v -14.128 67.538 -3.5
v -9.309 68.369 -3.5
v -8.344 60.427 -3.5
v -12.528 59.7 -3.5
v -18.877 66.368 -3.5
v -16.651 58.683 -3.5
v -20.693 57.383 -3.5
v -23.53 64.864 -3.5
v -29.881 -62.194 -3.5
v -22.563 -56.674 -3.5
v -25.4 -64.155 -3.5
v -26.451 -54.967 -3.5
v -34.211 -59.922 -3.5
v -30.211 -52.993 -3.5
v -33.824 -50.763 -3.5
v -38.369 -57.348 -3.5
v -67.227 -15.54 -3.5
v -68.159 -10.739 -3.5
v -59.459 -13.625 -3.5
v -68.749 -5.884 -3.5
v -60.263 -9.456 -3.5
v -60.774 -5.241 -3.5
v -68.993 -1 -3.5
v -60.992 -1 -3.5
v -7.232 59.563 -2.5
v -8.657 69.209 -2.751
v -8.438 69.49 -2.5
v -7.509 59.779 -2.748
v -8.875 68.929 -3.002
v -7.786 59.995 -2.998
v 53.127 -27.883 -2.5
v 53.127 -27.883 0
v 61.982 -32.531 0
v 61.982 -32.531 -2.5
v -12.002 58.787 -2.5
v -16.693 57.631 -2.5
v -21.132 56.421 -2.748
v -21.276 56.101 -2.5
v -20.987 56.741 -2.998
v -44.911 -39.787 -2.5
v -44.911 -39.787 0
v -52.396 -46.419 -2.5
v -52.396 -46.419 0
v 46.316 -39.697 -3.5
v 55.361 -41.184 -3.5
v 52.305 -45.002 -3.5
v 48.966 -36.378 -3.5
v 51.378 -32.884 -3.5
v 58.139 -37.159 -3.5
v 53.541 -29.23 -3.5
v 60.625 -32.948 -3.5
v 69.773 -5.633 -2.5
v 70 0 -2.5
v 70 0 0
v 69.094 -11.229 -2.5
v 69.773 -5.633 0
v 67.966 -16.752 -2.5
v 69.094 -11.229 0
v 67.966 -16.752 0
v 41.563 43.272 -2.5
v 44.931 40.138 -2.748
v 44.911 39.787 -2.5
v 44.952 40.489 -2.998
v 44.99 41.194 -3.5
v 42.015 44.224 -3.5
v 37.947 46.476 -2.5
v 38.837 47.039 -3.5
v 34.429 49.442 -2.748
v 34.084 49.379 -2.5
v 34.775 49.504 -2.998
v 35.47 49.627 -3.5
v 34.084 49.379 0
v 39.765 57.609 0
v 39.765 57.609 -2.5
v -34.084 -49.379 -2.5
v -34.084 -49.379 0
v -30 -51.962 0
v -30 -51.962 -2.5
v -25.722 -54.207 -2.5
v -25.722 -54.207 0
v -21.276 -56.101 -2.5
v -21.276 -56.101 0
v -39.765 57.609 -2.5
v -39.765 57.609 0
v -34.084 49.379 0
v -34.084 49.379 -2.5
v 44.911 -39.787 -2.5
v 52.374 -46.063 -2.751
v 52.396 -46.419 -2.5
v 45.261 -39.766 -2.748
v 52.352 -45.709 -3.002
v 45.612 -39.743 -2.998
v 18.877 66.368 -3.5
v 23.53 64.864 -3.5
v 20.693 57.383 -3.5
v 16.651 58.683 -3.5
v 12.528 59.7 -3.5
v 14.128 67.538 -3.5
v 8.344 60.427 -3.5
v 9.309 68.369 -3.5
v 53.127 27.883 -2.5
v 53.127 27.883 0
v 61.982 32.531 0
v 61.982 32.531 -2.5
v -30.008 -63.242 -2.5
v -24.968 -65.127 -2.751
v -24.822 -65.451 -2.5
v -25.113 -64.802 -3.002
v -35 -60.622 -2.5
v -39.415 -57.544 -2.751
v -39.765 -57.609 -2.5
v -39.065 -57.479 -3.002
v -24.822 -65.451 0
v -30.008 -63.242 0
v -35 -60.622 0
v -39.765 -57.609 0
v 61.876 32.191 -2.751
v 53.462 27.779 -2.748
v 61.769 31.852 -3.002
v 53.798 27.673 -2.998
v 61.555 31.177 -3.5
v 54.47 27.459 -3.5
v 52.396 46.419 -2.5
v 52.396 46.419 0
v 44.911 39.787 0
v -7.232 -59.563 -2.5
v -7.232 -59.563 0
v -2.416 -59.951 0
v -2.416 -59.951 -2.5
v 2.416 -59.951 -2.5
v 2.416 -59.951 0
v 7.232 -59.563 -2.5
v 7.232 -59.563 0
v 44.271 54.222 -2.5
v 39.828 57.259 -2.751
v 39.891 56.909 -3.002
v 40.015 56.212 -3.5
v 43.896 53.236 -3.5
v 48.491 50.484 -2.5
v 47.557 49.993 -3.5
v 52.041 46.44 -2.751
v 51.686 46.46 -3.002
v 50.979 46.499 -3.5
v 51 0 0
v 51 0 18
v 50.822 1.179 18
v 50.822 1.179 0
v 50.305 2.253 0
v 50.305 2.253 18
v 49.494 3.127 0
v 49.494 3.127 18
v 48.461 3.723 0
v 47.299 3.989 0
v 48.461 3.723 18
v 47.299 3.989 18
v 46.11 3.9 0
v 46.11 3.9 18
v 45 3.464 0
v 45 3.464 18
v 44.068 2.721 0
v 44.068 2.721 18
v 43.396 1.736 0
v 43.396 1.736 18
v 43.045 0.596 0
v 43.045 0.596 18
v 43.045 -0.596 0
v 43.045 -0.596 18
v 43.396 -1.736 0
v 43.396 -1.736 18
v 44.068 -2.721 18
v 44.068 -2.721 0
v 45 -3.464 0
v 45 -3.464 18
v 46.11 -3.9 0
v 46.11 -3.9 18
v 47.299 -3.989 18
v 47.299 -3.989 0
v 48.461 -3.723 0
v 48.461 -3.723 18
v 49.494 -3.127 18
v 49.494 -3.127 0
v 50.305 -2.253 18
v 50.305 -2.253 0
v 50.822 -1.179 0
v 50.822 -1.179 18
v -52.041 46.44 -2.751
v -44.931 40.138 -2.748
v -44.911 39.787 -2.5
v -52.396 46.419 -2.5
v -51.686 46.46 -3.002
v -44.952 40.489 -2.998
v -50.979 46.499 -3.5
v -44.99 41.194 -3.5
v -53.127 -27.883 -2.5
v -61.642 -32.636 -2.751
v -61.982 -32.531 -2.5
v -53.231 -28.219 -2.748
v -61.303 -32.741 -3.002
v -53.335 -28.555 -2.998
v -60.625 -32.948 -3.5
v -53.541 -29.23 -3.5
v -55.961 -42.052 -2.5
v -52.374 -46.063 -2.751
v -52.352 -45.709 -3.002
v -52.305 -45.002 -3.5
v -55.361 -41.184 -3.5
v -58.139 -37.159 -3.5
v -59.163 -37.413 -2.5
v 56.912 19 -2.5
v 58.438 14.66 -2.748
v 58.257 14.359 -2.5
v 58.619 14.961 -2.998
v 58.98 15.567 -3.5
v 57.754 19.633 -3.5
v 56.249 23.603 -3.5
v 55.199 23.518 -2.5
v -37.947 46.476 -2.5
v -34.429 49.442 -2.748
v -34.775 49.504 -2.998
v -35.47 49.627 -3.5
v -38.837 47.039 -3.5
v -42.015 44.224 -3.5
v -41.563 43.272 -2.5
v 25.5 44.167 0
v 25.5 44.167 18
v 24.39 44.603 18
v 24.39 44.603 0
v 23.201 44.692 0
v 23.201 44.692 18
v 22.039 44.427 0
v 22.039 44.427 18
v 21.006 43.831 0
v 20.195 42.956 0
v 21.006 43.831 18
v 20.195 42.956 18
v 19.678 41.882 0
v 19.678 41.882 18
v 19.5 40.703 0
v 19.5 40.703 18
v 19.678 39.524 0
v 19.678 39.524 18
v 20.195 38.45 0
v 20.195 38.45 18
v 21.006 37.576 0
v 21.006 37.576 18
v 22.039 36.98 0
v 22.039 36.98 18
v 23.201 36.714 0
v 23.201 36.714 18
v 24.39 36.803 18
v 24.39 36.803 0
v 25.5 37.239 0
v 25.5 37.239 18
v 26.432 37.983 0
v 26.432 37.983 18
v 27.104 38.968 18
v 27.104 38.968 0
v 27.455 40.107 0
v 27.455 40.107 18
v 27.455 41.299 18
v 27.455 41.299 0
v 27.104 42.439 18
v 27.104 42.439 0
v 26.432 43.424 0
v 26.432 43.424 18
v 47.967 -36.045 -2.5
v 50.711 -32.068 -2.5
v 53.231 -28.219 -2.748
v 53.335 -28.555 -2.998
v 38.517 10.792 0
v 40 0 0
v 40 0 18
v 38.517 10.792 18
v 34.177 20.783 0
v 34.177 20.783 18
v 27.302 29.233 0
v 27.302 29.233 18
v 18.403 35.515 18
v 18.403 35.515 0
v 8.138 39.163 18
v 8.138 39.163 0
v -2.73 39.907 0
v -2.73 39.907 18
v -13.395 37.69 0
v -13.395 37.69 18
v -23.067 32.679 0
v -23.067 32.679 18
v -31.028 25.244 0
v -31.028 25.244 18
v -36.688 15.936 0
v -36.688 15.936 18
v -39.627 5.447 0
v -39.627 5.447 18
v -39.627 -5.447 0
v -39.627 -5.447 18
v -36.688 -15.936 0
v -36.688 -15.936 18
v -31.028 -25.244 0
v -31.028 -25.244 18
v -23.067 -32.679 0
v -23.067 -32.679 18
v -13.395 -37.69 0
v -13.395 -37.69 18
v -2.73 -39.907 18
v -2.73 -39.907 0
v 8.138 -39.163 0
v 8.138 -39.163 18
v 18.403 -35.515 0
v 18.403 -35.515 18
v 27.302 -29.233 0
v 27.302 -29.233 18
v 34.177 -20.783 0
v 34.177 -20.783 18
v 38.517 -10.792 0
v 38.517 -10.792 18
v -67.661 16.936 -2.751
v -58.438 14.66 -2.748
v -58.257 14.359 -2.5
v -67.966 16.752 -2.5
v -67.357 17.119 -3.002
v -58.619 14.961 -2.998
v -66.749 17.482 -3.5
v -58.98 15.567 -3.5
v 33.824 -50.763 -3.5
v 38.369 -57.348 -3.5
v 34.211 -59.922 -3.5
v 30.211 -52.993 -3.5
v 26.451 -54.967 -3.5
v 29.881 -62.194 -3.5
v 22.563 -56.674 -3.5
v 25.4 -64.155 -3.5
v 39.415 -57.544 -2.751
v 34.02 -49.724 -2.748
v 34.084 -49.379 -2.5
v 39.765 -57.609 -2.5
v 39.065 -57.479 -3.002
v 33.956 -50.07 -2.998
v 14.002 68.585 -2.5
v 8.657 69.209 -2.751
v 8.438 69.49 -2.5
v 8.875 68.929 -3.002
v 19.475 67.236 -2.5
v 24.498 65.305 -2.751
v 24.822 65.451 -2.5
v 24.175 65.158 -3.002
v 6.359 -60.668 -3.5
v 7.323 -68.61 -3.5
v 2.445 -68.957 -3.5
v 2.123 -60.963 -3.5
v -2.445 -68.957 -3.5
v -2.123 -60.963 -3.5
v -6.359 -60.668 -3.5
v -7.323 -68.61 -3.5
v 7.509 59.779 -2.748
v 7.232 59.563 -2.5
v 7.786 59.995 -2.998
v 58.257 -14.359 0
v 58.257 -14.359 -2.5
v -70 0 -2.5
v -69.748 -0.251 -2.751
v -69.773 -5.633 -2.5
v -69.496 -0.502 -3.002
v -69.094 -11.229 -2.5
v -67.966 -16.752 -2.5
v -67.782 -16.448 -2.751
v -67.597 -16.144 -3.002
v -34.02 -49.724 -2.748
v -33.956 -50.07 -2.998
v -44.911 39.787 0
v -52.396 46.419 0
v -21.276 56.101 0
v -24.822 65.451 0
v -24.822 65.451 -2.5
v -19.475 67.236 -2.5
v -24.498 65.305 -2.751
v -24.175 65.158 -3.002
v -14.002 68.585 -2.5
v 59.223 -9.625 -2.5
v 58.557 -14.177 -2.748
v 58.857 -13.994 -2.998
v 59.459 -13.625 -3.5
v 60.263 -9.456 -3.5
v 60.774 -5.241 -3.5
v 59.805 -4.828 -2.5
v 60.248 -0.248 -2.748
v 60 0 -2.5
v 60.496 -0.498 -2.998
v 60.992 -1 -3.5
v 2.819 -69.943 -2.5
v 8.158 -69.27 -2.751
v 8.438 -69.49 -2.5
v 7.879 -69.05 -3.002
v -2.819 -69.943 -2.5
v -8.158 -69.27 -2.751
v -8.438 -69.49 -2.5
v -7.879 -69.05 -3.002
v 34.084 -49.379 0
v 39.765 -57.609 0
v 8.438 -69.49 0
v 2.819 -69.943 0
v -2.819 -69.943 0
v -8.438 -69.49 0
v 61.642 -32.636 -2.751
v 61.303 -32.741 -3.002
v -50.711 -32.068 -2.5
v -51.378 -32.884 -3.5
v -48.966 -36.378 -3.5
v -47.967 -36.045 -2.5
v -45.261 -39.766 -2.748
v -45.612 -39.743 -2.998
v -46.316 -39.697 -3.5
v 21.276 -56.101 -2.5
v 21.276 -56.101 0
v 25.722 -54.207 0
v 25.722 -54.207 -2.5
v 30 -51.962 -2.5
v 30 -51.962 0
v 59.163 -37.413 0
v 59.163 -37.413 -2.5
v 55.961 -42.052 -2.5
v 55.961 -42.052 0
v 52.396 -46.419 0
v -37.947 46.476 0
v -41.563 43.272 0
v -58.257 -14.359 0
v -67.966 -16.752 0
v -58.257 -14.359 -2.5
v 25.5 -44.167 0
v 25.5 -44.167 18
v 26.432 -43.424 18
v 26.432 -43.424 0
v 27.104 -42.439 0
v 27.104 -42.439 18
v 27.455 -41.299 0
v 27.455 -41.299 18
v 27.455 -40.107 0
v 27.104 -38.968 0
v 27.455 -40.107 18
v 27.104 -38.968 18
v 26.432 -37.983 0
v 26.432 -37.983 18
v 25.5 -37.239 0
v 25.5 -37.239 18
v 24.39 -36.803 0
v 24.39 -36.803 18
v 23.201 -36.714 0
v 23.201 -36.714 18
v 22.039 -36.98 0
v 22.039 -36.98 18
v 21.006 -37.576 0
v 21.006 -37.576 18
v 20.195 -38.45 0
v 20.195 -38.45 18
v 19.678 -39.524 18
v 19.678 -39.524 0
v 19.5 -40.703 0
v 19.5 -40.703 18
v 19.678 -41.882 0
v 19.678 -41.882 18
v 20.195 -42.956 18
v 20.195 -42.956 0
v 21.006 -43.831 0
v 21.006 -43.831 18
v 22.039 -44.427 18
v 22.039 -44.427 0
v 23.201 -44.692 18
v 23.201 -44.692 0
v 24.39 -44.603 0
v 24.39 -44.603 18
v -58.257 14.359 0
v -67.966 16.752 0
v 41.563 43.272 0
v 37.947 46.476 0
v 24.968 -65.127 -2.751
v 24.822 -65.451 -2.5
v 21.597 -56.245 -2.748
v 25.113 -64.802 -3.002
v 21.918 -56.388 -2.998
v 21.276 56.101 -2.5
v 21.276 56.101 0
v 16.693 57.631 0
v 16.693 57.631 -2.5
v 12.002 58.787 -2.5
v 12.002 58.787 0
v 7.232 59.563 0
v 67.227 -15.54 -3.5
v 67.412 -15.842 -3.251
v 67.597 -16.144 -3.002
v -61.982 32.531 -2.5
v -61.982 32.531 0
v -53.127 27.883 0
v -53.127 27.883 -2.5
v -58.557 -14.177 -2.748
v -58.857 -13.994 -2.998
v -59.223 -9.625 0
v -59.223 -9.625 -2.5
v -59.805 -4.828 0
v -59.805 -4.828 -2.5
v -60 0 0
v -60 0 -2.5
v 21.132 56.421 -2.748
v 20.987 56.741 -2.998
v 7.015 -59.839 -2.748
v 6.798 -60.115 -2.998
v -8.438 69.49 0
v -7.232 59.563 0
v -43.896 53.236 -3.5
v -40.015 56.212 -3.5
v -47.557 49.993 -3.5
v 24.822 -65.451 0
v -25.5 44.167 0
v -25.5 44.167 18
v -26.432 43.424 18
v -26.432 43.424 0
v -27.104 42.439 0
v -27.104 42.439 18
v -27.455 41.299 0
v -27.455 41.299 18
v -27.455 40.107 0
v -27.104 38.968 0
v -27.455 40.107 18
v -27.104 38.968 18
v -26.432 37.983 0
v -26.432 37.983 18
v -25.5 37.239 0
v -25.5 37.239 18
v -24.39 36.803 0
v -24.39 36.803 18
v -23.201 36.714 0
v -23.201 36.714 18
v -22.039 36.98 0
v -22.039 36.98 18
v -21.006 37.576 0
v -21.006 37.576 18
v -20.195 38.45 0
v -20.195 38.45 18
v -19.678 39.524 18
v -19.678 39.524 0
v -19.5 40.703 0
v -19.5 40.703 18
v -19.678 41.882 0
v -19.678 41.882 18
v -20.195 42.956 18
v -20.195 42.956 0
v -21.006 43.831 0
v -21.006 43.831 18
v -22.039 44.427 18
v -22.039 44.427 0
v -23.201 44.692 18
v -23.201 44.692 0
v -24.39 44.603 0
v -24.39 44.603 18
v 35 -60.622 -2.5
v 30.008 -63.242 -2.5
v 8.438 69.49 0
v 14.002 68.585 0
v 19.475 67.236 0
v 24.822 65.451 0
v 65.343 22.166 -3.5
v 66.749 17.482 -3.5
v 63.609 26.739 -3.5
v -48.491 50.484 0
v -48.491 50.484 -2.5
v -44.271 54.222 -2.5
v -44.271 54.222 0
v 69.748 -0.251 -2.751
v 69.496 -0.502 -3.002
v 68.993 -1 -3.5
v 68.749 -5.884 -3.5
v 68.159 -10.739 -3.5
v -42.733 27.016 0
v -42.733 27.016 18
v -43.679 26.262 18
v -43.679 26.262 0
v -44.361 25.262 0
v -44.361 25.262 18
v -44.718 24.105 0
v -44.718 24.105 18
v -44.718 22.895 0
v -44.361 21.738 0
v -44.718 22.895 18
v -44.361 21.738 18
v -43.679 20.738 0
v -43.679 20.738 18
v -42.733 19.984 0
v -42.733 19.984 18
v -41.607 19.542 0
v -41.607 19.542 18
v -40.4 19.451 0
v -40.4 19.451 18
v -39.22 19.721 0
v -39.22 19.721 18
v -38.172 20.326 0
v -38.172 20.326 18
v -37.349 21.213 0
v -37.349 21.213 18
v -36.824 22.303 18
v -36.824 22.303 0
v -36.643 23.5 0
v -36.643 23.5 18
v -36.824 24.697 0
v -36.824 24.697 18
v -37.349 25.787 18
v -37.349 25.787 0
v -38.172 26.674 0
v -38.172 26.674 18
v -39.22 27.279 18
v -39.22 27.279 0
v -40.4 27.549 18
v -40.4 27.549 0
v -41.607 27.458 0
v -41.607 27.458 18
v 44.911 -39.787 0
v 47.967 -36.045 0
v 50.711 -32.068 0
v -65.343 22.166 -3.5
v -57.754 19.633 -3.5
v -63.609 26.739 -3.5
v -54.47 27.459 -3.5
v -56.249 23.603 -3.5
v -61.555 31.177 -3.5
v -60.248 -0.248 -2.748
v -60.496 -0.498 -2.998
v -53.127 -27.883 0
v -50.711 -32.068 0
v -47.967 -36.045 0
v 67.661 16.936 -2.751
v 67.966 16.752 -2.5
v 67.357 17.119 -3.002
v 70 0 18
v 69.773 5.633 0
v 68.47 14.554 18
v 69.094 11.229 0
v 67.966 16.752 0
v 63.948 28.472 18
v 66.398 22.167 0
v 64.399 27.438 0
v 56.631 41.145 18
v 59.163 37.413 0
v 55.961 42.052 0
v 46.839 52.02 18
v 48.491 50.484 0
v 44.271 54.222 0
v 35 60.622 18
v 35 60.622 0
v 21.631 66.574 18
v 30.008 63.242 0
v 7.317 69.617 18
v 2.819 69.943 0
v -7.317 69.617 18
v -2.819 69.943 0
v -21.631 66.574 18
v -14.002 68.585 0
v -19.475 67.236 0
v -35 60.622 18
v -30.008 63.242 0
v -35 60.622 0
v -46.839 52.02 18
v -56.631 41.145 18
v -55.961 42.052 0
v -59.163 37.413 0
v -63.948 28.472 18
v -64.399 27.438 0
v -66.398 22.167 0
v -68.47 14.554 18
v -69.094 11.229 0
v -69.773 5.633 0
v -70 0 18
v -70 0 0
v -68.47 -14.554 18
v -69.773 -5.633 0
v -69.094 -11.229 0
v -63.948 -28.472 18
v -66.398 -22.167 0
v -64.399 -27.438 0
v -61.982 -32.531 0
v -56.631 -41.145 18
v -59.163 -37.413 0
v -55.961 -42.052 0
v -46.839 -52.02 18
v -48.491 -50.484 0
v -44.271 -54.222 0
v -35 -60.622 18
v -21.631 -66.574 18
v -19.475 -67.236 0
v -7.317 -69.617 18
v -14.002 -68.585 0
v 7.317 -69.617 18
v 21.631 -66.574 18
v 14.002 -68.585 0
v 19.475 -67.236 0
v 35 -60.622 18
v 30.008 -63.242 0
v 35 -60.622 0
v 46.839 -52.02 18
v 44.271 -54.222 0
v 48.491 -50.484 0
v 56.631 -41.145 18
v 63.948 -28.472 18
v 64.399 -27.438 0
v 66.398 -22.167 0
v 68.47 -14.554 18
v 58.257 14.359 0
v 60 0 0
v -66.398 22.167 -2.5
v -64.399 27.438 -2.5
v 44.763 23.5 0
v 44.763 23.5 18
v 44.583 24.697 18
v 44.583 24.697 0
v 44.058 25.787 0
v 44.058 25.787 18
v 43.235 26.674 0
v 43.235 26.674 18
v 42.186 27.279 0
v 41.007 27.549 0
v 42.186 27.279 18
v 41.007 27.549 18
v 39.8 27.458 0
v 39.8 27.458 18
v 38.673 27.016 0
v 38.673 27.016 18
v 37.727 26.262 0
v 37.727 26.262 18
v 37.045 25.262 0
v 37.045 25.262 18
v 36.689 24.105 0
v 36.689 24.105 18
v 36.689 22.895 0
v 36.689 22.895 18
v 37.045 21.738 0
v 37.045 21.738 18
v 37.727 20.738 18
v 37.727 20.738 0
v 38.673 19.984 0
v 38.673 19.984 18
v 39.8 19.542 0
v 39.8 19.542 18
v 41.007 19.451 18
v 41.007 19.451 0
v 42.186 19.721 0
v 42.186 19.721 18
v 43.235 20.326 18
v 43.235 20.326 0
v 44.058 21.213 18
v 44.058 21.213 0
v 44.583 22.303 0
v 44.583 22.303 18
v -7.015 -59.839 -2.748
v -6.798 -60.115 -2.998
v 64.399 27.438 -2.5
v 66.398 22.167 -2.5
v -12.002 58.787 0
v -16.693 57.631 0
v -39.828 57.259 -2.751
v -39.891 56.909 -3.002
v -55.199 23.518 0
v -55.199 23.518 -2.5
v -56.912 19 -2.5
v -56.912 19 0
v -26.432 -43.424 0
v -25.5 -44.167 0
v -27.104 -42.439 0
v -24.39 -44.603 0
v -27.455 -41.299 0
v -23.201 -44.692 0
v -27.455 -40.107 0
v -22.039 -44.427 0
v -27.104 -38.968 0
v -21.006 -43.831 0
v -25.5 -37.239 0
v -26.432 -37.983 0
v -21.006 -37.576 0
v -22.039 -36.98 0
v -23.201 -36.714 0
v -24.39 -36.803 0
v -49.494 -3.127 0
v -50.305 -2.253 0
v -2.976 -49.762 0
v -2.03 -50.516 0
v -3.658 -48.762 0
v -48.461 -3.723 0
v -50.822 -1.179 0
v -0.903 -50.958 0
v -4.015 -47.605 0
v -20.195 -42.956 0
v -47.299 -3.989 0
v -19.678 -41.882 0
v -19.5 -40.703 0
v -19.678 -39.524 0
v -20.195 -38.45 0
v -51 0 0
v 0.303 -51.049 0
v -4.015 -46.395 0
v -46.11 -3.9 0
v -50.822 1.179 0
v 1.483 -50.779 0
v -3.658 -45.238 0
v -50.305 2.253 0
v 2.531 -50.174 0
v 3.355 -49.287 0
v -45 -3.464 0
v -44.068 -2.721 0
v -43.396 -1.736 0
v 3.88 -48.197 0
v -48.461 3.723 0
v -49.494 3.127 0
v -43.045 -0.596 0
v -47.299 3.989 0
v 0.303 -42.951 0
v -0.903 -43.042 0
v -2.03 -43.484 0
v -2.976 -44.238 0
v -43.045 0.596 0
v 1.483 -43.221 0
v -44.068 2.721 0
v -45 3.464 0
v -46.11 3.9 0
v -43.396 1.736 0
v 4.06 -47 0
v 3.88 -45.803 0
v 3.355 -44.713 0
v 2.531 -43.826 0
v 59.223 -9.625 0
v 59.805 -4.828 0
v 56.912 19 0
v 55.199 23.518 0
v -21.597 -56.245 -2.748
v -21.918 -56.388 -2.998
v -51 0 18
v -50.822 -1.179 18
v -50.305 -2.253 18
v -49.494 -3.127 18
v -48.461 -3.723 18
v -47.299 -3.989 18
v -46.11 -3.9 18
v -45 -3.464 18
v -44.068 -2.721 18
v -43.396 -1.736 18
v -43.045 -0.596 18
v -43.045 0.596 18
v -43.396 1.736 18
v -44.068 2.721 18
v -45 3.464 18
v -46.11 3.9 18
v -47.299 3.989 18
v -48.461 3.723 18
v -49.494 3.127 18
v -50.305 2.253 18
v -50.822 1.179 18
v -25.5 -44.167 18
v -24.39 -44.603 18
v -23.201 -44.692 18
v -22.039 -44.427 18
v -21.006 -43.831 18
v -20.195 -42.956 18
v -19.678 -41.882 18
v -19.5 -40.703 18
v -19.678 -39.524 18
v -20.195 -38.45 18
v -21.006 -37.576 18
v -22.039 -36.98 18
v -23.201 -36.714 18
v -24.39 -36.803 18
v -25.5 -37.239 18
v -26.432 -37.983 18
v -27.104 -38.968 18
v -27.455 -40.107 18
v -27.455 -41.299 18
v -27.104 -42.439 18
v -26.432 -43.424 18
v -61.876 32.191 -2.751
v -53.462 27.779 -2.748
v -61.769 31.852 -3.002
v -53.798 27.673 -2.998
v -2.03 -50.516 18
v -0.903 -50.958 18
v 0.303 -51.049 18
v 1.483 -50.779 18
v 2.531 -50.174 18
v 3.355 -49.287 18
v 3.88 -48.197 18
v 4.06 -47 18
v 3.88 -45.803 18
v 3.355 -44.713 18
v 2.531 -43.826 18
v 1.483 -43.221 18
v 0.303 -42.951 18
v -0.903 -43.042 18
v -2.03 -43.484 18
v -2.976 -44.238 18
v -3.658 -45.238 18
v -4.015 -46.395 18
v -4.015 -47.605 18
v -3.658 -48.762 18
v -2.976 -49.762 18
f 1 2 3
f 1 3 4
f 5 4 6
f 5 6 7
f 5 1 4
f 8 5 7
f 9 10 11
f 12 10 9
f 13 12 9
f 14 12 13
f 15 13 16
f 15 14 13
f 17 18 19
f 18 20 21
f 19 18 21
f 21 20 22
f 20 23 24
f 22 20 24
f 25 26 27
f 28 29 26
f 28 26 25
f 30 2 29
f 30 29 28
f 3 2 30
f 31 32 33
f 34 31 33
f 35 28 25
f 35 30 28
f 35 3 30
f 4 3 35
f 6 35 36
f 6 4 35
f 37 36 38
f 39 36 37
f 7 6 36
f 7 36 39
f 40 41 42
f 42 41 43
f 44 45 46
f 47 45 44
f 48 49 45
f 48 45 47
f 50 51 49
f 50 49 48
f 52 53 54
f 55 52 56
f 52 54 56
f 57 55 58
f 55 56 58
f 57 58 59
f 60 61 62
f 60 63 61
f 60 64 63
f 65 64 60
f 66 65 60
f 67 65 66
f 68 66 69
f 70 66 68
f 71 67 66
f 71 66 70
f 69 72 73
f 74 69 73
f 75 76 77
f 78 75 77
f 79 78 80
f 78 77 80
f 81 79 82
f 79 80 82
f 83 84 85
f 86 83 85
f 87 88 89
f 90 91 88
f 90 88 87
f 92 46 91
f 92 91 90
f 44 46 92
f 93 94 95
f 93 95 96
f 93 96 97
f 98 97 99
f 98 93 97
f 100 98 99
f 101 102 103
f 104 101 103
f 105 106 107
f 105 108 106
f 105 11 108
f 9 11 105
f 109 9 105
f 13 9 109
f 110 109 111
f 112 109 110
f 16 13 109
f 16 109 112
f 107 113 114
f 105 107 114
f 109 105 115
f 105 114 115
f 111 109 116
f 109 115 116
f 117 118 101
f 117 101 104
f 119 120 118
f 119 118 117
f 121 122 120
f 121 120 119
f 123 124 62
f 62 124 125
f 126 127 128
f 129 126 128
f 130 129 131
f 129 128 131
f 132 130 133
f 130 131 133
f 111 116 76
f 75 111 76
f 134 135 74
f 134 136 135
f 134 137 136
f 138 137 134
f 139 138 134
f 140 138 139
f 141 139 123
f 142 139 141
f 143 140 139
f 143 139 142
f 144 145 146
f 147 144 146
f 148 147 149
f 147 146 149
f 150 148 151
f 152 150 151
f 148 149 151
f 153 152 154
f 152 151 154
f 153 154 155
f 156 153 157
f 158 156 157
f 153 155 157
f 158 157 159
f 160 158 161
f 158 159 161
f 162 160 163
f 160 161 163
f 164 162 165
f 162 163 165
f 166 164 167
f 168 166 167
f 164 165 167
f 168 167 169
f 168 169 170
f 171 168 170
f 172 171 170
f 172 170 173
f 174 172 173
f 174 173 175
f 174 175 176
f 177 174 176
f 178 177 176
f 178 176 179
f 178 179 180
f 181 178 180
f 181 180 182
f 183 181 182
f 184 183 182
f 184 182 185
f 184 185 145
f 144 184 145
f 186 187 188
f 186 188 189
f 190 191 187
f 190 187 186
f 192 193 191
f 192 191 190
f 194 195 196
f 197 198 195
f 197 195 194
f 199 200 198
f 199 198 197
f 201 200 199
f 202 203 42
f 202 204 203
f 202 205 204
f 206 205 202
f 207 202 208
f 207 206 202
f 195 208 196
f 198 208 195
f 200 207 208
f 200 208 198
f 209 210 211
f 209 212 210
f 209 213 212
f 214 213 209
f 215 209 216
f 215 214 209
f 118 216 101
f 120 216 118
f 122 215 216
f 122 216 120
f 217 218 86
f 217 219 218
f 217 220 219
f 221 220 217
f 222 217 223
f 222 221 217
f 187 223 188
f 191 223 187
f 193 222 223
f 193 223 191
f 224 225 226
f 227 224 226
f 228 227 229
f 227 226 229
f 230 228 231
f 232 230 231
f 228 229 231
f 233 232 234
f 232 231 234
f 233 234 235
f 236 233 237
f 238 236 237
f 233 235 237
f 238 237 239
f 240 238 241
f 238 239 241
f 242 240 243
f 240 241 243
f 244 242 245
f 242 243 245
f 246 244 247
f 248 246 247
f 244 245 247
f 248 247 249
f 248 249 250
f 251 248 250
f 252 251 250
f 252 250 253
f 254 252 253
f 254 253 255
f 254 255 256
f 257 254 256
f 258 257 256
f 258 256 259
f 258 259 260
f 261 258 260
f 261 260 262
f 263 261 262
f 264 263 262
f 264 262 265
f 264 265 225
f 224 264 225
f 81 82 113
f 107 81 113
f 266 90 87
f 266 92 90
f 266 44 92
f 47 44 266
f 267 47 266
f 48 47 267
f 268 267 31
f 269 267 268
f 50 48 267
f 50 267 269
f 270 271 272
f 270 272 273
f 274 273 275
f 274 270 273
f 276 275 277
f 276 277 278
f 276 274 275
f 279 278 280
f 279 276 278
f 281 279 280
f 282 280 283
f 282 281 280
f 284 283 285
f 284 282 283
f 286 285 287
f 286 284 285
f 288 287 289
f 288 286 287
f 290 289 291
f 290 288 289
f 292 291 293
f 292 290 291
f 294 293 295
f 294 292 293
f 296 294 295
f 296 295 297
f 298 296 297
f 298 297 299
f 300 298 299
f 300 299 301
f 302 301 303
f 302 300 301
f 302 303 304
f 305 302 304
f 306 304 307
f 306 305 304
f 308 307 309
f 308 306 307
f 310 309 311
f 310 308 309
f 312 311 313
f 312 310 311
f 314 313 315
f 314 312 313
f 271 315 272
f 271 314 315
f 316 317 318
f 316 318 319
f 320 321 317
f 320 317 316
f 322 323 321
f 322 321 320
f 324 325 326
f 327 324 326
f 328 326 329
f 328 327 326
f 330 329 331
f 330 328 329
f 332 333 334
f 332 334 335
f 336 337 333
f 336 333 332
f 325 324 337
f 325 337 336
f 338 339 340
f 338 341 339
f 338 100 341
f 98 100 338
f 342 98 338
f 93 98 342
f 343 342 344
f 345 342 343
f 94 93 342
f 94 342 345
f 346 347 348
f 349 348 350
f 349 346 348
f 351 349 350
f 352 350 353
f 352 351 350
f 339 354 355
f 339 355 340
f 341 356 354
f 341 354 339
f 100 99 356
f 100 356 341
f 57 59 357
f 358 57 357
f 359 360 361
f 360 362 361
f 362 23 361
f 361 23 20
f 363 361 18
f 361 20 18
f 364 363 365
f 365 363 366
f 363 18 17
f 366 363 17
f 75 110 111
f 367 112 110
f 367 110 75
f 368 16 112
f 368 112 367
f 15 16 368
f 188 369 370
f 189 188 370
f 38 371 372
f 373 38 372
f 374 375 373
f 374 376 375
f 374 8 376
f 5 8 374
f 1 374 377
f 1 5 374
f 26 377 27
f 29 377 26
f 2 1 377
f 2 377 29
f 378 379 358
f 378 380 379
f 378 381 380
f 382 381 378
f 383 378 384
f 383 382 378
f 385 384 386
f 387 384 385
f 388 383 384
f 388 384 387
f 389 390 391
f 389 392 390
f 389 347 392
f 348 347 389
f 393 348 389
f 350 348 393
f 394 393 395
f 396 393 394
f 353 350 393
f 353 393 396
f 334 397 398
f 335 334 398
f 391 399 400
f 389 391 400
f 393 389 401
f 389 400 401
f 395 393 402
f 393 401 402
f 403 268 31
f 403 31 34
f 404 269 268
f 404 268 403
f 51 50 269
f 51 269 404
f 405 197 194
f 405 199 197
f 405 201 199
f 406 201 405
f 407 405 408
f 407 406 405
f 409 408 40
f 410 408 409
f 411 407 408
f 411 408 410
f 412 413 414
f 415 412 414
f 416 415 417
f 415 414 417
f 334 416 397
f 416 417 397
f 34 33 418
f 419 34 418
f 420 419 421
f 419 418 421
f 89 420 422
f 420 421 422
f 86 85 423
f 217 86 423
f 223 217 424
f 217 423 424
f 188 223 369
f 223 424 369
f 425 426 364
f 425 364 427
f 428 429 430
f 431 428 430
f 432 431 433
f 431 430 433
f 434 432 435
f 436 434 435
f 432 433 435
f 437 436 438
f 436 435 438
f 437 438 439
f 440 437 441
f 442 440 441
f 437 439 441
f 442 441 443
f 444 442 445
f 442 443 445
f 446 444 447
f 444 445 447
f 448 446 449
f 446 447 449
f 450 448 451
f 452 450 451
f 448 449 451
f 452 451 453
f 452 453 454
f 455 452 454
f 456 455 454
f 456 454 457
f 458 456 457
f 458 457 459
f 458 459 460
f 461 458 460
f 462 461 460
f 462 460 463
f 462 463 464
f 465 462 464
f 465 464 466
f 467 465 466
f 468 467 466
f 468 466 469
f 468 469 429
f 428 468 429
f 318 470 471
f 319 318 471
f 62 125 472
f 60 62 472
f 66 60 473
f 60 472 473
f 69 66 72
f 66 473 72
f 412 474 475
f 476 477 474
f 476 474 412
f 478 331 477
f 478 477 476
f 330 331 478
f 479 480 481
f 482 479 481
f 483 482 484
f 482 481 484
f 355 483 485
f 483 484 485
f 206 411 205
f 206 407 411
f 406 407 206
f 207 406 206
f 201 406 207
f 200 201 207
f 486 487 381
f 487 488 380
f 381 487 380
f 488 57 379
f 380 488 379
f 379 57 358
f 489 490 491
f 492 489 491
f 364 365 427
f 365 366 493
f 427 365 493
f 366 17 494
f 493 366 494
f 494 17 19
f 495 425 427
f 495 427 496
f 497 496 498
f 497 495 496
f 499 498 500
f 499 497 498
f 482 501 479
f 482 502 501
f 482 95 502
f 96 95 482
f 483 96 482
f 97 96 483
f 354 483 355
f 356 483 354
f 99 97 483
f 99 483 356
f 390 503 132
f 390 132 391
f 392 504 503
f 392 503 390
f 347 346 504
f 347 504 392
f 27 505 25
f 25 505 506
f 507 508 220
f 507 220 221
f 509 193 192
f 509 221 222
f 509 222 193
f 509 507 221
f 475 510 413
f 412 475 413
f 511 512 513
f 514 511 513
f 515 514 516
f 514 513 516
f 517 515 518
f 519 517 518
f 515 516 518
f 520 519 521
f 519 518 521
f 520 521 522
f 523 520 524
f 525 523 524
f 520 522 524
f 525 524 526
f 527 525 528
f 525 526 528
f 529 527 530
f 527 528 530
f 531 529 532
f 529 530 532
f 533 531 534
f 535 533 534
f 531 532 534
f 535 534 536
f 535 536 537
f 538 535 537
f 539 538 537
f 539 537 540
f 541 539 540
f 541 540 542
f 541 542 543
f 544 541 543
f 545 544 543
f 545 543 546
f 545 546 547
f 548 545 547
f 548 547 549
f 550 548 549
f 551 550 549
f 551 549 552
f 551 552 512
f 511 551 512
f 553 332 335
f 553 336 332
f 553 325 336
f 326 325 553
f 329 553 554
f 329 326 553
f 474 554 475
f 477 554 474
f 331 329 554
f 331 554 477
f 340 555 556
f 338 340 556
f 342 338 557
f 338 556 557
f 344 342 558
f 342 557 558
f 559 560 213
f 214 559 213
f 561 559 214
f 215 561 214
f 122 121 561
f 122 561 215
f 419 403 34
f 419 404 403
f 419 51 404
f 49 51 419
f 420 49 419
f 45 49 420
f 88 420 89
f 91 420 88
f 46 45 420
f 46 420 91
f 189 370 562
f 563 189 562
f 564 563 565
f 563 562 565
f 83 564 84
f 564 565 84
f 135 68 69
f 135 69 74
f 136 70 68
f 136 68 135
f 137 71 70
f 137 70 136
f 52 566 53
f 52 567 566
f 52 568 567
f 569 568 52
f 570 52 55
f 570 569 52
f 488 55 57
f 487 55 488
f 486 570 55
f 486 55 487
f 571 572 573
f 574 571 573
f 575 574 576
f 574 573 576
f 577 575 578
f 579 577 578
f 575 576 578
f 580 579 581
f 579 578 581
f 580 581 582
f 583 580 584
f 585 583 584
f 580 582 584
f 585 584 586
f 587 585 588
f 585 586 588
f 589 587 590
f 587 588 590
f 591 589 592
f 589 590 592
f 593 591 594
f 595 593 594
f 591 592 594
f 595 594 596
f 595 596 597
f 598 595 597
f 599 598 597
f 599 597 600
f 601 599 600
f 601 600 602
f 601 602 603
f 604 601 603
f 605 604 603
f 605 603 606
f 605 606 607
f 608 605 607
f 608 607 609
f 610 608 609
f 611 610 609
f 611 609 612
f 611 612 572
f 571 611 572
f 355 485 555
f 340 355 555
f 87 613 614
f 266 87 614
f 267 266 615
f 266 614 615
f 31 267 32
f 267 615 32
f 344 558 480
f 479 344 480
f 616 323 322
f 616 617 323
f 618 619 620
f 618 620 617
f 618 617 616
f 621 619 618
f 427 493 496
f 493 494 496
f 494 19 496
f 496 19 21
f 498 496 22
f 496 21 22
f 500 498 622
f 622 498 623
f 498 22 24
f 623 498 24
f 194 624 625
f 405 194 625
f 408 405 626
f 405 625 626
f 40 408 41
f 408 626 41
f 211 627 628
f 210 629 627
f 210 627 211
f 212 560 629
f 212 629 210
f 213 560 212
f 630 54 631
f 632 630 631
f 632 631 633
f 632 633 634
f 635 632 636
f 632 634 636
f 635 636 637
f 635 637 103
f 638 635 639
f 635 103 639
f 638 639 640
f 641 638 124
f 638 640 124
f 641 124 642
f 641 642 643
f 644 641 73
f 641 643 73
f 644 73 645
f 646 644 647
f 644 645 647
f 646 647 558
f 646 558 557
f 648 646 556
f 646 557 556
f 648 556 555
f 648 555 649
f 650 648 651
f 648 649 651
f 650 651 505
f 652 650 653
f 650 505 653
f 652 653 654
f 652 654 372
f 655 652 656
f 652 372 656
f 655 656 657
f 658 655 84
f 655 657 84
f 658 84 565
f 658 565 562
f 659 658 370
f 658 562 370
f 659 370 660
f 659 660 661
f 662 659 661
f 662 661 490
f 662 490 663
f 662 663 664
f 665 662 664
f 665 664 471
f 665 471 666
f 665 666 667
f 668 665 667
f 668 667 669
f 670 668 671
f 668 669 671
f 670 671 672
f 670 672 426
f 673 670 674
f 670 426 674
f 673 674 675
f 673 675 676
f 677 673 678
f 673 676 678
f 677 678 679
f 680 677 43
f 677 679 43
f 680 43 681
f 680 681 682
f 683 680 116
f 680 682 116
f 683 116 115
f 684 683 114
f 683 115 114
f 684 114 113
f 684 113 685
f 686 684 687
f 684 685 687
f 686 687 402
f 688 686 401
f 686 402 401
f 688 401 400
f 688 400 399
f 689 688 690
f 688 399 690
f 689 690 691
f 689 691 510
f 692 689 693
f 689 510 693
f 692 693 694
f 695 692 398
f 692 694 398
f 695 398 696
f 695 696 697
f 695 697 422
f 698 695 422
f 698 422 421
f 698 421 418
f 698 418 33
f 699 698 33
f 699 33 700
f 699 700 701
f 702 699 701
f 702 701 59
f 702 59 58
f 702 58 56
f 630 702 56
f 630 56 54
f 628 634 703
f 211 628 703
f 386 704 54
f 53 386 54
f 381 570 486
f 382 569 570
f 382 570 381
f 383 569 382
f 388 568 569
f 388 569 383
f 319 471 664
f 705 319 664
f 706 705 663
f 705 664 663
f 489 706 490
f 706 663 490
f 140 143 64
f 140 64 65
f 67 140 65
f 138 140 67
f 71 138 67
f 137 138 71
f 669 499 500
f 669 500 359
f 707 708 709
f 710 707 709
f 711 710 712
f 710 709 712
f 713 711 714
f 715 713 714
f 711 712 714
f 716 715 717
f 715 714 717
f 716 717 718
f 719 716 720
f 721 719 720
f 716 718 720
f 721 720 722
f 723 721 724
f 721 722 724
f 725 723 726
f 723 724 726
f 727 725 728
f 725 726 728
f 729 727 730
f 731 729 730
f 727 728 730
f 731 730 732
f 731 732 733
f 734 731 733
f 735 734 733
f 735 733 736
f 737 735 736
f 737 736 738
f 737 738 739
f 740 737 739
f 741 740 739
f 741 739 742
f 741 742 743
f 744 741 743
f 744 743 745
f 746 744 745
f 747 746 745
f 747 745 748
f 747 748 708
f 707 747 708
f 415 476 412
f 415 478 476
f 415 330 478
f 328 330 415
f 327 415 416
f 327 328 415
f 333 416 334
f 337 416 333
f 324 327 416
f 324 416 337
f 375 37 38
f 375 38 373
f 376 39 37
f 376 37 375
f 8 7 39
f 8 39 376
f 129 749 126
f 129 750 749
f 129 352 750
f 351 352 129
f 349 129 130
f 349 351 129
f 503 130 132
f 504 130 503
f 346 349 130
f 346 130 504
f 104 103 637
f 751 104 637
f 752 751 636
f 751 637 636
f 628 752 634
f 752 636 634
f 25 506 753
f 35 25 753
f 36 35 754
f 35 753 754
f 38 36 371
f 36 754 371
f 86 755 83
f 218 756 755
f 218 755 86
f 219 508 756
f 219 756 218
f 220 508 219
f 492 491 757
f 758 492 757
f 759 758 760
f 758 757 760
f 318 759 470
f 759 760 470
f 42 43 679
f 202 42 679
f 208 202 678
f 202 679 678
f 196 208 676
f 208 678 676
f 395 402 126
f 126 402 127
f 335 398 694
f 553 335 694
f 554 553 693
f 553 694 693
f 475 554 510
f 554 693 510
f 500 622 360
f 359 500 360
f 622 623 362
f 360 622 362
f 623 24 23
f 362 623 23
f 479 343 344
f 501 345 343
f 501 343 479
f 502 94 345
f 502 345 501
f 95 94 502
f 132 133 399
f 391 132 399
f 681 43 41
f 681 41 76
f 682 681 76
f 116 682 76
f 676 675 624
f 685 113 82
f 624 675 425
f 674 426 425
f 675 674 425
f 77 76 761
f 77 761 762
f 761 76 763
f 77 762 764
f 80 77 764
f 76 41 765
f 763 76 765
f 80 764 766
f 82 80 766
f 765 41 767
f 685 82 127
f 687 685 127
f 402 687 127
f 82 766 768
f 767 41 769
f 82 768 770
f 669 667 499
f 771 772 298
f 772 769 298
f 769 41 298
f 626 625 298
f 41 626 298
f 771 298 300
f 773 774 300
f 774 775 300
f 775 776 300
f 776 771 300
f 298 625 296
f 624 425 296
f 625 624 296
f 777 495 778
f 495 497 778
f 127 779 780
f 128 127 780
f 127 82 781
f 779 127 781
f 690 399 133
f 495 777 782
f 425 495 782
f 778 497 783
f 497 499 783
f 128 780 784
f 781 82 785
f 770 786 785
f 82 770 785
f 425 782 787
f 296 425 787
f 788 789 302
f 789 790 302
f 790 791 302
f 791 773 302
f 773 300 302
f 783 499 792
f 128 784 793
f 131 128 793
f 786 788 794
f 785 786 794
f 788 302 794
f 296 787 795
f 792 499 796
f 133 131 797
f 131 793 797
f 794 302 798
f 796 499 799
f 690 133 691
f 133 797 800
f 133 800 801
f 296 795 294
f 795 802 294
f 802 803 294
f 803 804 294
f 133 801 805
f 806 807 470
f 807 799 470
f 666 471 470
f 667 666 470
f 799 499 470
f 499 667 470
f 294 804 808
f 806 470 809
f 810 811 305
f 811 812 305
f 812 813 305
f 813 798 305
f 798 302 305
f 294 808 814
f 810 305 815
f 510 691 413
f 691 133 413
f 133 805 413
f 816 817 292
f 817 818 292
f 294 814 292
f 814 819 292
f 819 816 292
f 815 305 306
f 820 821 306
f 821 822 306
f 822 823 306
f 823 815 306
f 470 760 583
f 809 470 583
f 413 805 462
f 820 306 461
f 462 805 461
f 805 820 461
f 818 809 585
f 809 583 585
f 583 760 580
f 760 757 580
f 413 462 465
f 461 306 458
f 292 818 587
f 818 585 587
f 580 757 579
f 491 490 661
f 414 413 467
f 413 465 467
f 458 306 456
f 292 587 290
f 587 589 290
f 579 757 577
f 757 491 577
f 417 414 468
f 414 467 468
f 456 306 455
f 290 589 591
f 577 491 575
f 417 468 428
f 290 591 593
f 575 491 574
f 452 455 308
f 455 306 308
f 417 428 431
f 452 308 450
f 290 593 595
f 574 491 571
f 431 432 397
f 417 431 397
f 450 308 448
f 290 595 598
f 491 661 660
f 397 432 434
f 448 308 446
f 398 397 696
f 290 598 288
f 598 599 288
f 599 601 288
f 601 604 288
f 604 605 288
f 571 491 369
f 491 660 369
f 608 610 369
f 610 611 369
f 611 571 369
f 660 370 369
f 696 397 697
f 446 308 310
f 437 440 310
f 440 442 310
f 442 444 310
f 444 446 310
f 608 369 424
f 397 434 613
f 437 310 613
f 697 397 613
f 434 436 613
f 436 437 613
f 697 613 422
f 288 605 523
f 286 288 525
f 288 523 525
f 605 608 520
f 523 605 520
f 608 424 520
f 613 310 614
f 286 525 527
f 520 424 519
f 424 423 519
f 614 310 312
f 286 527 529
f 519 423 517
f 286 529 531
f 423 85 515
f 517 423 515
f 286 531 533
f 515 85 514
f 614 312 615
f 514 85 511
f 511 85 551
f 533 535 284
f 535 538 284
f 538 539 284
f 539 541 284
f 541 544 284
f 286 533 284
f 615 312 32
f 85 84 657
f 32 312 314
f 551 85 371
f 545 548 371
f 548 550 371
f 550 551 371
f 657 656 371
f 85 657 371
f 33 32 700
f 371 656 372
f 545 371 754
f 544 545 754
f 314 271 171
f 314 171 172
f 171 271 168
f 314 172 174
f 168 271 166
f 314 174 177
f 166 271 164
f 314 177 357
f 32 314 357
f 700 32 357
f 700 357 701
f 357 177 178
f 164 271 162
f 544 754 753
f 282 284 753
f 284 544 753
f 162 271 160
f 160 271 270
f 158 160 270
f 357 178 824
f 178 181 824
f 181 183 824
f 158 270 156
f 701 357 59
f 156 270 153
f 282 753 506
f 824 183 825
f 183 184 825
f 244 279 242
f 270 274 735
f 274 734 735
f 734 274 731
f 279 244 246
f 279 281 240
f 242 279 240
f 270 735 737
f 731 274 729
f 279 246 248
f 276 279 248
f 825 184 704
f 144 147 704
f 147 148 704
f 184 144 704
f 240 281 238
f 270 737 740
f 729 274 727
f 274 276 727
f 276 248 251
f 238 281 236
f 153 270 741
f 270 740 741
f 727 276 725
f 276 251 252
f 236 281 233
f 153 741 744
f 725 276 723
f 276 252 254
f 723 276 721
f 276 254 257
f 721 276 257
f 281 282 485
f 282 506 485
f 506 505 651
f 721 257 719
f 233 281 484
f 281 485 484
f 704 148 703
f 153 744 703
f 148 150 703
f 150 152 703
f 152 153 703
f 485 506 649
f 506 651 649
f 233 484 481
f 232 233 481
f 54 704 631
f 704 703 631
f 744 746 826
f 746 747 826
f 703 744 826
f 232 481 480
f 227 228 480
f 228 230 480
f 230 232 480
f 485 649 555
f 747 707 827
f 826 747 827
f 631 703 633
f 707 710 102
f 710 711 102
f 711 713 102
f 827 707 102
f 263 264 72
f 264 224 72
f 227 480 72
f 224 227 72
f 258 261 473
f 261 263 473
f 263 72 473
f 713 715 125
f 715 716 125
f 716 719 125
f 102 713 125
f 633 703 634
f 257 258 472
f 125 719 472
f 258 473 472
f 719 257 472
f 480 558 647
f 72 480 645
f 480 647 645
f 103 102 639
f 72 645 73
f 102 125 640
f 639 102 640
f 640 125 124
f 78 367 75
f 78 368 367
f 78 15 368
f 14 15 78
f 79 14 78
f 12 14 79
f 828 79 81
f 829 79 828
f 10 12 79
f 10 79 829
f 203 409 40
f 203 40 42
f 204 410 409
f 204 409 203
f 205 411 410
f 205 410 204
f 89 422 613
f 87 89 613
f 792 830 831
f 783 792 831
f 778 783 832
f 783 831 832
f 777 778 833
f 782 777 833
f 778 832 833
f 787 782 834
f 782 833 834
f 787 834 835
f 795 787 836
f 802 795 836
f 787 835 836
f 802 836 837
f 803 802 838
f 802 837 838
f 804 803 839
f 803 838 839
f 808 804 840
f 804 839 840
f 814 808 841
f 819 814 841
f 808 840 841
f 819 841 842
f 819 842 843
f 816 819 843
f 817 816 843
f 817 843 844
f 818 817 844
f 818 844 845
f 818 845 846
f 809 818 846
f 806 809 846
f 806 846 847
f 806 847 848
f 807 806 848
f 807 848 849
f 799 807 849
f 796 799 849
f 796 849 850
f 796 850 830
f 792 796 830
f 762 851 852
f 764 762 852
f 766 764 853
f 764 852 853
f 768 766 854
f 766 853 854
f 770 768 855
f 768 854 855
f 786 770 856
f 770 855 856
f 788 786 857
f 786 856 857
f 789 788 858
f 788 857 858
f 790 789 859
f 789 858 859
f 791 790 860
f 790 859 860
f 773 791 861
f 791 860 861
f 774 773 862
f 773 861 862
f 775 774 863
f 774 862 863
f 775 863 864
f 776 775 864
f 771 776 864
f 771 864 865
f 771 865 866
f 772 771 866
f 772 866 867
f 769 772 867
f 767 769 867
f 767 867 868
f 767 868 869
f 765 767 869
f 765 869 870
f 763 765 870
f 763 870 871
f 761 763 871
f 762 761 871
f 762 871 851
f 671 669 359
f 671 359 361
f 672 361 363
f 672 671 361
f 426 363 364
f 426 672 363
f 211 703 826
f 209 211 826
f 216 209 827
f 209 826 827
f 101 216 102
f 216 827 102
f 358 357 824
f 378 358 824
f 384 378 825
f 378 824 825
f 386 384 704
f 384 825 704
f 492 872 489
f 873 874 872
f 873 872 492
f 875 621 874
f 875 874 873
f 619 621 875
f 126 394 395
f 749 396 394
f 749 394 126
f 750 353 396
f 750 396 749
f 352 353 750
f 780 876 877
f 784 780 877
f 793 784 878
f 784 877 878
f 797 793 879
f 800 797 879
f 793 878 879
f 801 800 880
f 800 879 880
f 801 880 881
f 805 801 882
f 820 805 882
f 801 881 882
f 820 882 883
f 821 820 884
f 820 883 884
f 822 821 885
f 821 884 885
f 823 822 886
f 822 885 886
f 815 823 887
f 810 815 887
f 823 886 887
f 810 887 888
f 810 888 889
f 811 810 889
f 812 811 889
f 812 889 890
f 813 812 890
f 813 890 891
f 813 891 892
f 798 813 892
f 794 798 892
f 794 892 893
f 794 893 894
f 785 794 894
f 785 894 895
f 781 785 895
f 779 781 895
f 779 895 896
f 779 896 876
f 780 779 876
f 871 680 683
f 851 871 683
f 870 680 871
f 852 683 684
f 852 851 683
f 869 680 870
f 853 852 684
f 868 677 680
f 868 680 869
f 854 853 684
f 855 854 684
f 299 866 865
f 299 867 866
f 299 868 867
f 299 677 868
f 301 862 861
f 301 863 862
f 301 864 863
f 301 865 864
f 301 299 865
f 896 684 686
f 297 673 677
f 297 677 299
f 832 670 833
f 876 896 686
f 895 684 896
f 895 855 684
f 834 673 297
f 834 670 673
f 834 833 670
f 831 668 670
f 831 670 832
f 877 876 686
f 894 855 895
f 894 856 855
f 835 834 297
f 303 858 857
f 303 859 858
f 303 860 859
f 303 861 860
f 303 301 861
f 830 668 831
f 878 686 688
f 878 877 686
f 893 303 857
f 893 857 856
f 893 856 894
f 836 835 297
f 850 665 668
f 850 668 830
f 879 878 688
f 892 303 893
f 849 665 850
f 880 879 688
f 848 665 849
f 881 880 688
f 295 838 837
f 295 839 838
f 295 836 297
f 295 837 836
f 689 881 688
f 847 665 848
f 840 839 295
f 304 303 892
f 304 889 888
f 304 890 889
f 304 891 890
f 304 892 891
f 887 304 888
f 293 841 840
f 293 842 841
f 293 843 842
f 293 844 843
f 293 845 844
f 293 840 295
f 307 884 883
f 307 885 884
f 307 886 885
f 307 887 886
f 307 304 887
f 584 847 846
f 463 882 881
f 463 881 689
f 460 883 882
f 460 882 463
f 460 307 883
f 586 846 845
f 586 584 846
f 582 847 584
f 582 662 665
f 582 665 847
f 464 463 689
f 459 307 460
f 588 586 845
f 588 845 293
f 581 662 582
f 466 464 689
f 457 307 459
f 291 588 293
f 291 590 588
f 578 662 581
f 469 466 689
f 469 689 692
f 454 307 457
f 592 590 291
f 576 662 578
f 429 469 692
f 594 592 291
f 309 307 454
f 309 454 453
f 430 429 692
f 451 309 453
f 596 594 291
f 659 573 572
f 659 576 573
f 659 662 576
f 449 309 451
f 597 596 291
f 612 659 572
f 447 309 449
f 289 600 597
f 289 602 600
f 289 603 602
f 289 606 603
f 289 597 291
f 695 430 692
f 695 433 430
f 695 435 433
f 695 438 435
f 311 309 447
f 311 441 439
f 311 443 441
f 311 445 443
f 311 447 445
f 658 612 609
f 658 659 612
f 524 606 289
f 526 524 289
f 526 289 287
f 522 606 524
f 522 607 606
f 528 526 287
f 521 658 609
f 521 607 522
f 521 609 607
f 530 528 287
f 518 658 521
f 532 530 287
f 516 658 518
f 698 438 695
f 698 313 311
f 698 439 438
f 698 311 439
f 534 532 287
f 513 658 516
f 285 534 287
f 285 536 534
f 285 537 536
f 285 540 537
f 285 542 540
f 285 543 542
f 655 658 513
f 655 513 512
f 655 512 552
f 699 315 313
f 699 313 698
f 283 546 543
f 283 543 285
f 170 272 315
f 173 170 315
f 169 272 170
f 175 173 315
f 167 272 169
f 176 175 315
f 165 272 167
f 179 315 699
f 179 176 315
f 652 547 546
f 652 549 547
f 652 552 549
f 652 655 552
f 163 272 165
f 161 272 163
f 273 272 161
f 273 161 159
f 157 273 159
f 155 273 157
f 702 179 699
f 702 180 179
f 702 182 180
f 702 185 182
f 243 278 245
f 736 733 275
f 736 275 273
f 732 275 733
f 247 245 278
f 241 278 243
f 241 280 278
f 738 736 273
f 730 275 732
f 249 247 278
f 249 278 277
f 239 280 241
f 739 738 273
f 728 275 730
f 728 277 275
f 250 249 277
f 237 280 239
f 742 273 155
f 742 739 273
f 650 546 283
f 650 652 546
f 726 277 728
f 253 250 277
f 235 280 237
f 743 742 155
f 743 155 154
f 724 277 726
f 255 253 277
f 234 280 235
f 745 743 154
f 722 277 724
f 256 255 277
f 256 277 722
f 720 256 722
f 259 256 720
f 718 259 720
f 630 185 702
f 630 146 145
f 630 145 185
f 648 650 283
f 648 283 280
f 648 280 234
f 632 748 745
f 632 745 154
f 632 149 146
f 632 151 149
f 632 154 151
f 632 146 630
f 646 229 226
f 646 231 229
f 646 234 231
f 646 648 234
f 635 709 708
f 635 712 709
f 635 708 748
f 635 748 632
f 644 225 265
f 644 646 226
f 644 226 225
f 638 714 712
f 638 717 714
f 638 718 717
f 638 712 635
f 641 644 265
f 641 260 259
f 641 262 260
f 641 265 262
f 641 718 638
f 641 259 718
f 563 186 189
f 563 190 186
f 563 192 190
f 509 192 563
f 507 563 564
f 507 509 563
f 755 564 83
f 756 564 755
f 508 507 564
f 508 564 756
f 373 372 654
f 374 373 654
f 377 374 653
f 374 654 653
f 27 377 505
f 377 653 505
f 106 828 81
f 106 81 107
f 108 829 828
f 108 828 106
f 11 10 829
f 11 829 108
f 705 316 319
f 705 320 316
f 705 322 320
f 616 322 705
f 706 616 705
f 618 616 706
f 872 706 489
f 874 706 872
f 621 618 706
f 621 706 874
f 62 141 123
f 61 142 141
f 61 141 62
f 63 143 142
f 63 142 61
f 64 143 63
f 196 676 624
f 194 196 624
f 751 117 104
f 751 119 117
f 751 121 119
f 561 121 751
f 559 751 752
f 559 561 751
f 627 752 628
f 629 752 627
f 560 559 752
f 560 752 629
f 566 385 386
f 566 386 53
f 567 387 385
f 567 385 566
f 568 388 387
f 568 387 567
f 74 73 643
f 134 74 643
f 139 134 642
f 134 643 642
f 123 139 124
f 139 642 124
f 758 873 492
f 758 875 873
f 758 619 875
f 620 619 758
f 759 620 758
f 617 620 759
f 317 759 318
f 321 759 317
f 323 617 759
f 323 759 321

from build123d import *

# Parameters (mm, degrees)
SKETCH_1_R               = 70
SKETCH_1_R_2             = 40
EXTRUDE_1_DEPTH          = 18
SKETCH_2_R               = 4
CUT_EXTRUDE_1_DEPTH      = 20
PATTERN_CIRCULAR_1_COUNT = 6
SKETCH_3_R               = 4.06
CUT_EXTRUDE_2_DEPTH      = 20
PATTERN_CIRCULAR_2_COUNT = 3
EXTRUDE_2_DEPTH          = 3.5
CHAMFER_1_SIZE           = 1


with BuildPart() as part:
    # 草图1 → 凸台-拉伸1 (new body)
    with BuildSketch(Plane.XY):
        Circle(SKETCH_1_R)
        Circle(SKETCH_1_R_2, mode=Mode.SUBTRACT)
    extrude(amount=EXTRUDE_1_DEPTH)

    # 草图2 → 切除-拉伸1 (cut)
    with BuildSketch(Plane.XY.offset(18)):
        with Locations((47, 0)):
            Circle(SKETCH_2_R)
    cut_extrude_1 = extrude(amount=-CUT_EXTRUDE_1_DEPTH, mode=Mode.SUBTRACT)

    # 阵列(圆周)1: 切除-拉伸1 ×6 about axis
    pattern_circular_1_axis = Axis((0, 0, 0), (0, 0, 1))
    for i in range(1, PATTERN_CIRCULAR_1_COUNT):
        add(cut_extrude_1.rotate(pattern_circular_1_axis, i * 360 / PATTERN_CIRCULAR_1_COUNT), mode=Mode.SUBTRACT)

    # 草图3 → 切除-拉伸2 (cut)
    with BuildSketch(Plane.XY.offset(18)):
        with Locations((40.703193978, 23.5)):
            Circle(SKETCH_3_R)
    cut_extrude_2 = extrude(amount=-CUT_EXTRUDE_2_DEPTH, mode=Mode.SUBTRACT)

    # 阵列(圆周)2: 切除-拉伸2 ×3 about axis
    pattern_circular_2_axis = Axis((0, 0, 0), (0, 0, 1))
    for i in range(1, PATTERN_CIRCULAR_2_COUNT):
        add(cut_extrude_2.rotate(pattern_circular_2_axis, i * 360 / PATTERN_CIRCULAR_2_COUNT), mode=Mode.SUBTRACT)

    # 草图4 → 凸台-拉伸2 (add)
    with BuildSketch(Plane(origin=(0, 0, 0), x_dir=(-1, 0, 0), z_dir=(0, 0, -1))):
        with BuildLine():
            Line((60, 0), (70, 0))
            ThreePointArc((70, 0), (69.489621187, -8.437567618), (67.96592722, -16.7520965))
            Line((67.96592722, -16.7520965), (58.256509046, -14.358939857))
            ThreePointArc((58.256509046, -14.358939857), (59.562532446, -7.232200815), (60, 0))
        make_face()
        with BuildLine():
            Line((58.256509046, 14.358939857), (67.96592722, 16.7520965))
            ThreePointArc((67.96592722, 16.7520965), (65.451136988, 24.822342093), (61.981921796, 32.530622043))
            Line((61.981921796, 32.530622043), (53.127361539, 27.883390323))
            ThreePointArc((53.127361539, 27.883390323), (56.100974561, 21.276293223), (58.256509046, 14.358939857))
        make_face()
        with BuildLine():
            Line((44.91064489, 39.787359494), (52.395752372, 46.418586077))
            ThreePointArc((52.395752372, 46.418586077), (46.418586077, 52.395752372), (39.764532271, 57.608870613))
            Line((39.764532271, 57.608870613), (34.083884804, 49.379031954))
            ThreePointArc((34.083884804, 49.379031954), (39.787359494, 44.91064489), (44.91064489, 39.787359494))
        make_face()
        with BuildLine():
            Line((21.276293223, 56.100974561), (24.822342093, 65.451136988))
            ThreePointArc((24.822342093, 65.451136988), (16.7520965, 67.96592722), (8.437567618, 69.489621187))
            Line((8.437567618, 69.489621187), (7.232200815, 59.562532446))
            ThreePointArc((7.232200815, 59.562532446), (14.358939857, 58.256509046), (21.276293223, 56.100974561))
        make_face()
        with BuildLine():
            Line((-7.232200815, 59.562532446), (-8.437567618, 69.489621187))
            ThreePointArc((-8.437567618, 69.489621187), (-16.7520965, 67.96592722), (-24.822342093, 65.451136988))
            Line((-24.822342093, 65.451136988), (-21.276293223, 56.100974561))
            ThreePointArc((-21.276293223, 56.100974561), (-14.358939857, 58.256509046), (-7.232200815, 59.562532446))
        make_face()
        with BuildLine():
            Line((-34.083884804, 49.379031954), (-39.764532271, 57.608870613))
            ThreePointArc((-39.764532271, 57.608870613), (-46.418586077, 52.395752372), (-52.395752372, 46.418586077))
            Line((-52.395752372, 46.418586077), (-44.91064489, 39.787359494))
            ThreePointArc((-44.91064489, 39.787359494), (-39.787359494, 44.91064489), (-34.083884804, 49.379031954))
        make_face()
        with BuildLine():
            Line((-53.127361539, 27.883390323), (-61.981921796, 32.530622043))
            ThreePointArc((-61.981921796, 32.530622043), (-65.451136988, 24.822342093), (-67.96592722, 16.7520965))
            Line((-67.96592722, 16.7520965), (-58.256509046, 14.358939857))
            ThreePointArc((-58.256509046, 14.358939857), (-56.100974561, 21.276293223), (-53.127361539, 27.883390323))
        make_face()
        with BuildLine():
            Line((-60, 0), (-70, 0))
            ThreePointArc((-70, 0), (-69.489621187, -8.437567618), (-67.96592722, -16.7520965))
            Line((-67.96592722, -16.7520965), (-58.256509046, -14.358939857))
            ThreePointArc((-58.256509046, -14.358939857), (-59.562532446, -7.232200815), (-60, 0))
        make_face()
        with BuildLine():
            Line((-53.127361539, -27.883390323), (-61.981921796, -32.530622043))
            ThreePointArc((-61.981921796, -32.530622043), (-57.608870613, -39.764532271), (-52.395752372, -46.418586077))
            Line((-52.395752372, -46.418586077), (-44.91064489, -39.787359494))
            ThreePointArc((-44.91064489, -39.787359494), (-49.379031954, -34.083884804), (-53.127361539, -27.883390323))
        make_face()
        with BuildLine():
            Line((-34.083884804, -49.379031954), (-39.764532271, -57.608870613))
            ThreePointArc((-39.764532271, -57.608870613), (-32.530622043, -61.981921796), (-24.822342093, -65.451136988))
            Line((-24.822342093, -65.451136988), (-21.276293223, -56.100974561))
            ThreePointArc((-21.276293223, -56.100974561), (-27.883390323, -53.127361539), (-34.083884804, -49.379031954))
        make_face()
        with BuildLine():
            Line((-7.232200815, -59.562532446), (-8.437567618, -69.489621187))
            ThreePointArc((-8.437567618, -69.489621187), (0, -70), (8.437567618, -69.489621187))
            Line((8.437567618, -69.489621187), (7.232200815, -59.562532446))
            ThreePointArc((7.232200815, -59.562532446), (0, -60), (-7.232200815, -59.562532446))
        make_face()
        with BuildLine():
            Line((21.276293223, -56.100974561), (24.822342093, -65.451136988))
            ThreePointArc((24.822342093, -65.451136988), (32.530622043, -61.981921796), (39.764532271, -57.608870613))
            Line((39.764532271, -57.608870613), (34.083884804, -49.379031954))
            ThreePointArc((34.083884804, -49.379031954), (27.883390323, -53.127361539), (21.276293223, -56.100974561))
        make_face()
        with BuildLine():
            Line((44.91064489, -39.787359494), (52.395752372, -46.418586077))
            ThreePointArc((52.395752372, -46.418586077), (57.608870613, -39.764532271), (61.981921796, -32.530622043))
            Line((61.981921796, -32.530622043), (53.127361539, -27.883390323))
            ThreePointArc((53.127361539, -27.883390323), (49.379031954, -34.083884804), (44.91064489, -39.787359494))
        make_face()
    extrude(amount=EXTRUDE_2_DEPTH)

    # 倒角1
    chamfer_1_edges = [part.edges().sort_by_distance(p)[0] for p in [
        (-23.049317658, -60.776055775, -3.5),
        (-27.883390323, -53.127361539, -3.5),
        (-36.924208538, -53.493951283, -3.5),
        (-32.530622043, -61.981921796, -3.5),
        (7.834884217, -64.526076816, -3.5),
        (0, -60, -3.5),
        (-7.834884217, -64.526076816, -3.5),
        (0, -70, -3.5),
        (36.924208538, -53.493951283, -3.5),
        (27.883390323, -53.127361539, -3.5),
        (23.049317658, -60.776055775, -3.5),
        (32.530622043, -61.981921796, -3.5),
        (57.554641667, -30.207006183, -3.5),
        (49.379031954, -34.083884804, -3.5),
        (48.653198631, -43.102972786, -3.5),
        (57.608870613, -39.764532271, -3.5),
        (65, 0, -3.5),
        (59.562532446, -7.232200815, -3.5),
        (63.111218133, -15.555518179, -3.5),
        (69.489621187, -8.437567618, -3.5),
        (57.554641667, 30.207006183, -3.5),
        (56.100974561, 21.276293223, -3.5),
        (63.111218133, 15.555518179, -3.5),
        (65.451136988, 24.822342093, -3.5),
        (36.924208538, 53.493951283, -3.5),
        (39.787359494, 44.91064489, -3.5),
        (48.653198631, 43.102972786, -3.5),
        (46.418586077, 52.395752372, -3.5),
        (7.834884217, 64.526076816, -3.5),
        (14.358939857, 58.256509046, -3.5),
        (23.049317658, 60.776055775, -3.5),
        (16.7520965, 67.96592722, -3.5),
        (-23.049317658, 60.776055775, -3.5),
        (-14.358939857, 58.256509046, -3.5),
        (-7.834884217, 64.526076816, -3.5),
        (-16.7520965, 67.96592722, -3.5),
        (-48.653198631, 43.102972786, -3.5),
        (-39.787359494, 44.91064489, -3.5),
        (-36.924208538, 53.493951283, -3.5),
        (-46.418586077, 52.395752372, -3.5),
        (-63.111218133, 15.555518179, -3.5),
        (-56.100974561, 21.276293223, -3.5),
        (-57.554641667, 30.207006183, -3.5),
        (-65.451136988, 24.822342093, -3.5),
        (-63.111218133, -15.555518179, -3.5),
        (-59.562532446, -7.232200815, -3.5),
        (-65, 0, -3.5),
        (-69.489621187, -8.437567618, -3.5),
        (-48.653198631, -43.102972786, -3.5),
        (-49.379031954, -34.083884804, -3.5),
        (-57.554641667, -30.207006183, -3.5),
        (-57.608870613, -39.764532271, -3.5),
    ]]
    chamfer(chamfer_1_edges, length=CHAMFER_1_SIZE)


solid = part.part
